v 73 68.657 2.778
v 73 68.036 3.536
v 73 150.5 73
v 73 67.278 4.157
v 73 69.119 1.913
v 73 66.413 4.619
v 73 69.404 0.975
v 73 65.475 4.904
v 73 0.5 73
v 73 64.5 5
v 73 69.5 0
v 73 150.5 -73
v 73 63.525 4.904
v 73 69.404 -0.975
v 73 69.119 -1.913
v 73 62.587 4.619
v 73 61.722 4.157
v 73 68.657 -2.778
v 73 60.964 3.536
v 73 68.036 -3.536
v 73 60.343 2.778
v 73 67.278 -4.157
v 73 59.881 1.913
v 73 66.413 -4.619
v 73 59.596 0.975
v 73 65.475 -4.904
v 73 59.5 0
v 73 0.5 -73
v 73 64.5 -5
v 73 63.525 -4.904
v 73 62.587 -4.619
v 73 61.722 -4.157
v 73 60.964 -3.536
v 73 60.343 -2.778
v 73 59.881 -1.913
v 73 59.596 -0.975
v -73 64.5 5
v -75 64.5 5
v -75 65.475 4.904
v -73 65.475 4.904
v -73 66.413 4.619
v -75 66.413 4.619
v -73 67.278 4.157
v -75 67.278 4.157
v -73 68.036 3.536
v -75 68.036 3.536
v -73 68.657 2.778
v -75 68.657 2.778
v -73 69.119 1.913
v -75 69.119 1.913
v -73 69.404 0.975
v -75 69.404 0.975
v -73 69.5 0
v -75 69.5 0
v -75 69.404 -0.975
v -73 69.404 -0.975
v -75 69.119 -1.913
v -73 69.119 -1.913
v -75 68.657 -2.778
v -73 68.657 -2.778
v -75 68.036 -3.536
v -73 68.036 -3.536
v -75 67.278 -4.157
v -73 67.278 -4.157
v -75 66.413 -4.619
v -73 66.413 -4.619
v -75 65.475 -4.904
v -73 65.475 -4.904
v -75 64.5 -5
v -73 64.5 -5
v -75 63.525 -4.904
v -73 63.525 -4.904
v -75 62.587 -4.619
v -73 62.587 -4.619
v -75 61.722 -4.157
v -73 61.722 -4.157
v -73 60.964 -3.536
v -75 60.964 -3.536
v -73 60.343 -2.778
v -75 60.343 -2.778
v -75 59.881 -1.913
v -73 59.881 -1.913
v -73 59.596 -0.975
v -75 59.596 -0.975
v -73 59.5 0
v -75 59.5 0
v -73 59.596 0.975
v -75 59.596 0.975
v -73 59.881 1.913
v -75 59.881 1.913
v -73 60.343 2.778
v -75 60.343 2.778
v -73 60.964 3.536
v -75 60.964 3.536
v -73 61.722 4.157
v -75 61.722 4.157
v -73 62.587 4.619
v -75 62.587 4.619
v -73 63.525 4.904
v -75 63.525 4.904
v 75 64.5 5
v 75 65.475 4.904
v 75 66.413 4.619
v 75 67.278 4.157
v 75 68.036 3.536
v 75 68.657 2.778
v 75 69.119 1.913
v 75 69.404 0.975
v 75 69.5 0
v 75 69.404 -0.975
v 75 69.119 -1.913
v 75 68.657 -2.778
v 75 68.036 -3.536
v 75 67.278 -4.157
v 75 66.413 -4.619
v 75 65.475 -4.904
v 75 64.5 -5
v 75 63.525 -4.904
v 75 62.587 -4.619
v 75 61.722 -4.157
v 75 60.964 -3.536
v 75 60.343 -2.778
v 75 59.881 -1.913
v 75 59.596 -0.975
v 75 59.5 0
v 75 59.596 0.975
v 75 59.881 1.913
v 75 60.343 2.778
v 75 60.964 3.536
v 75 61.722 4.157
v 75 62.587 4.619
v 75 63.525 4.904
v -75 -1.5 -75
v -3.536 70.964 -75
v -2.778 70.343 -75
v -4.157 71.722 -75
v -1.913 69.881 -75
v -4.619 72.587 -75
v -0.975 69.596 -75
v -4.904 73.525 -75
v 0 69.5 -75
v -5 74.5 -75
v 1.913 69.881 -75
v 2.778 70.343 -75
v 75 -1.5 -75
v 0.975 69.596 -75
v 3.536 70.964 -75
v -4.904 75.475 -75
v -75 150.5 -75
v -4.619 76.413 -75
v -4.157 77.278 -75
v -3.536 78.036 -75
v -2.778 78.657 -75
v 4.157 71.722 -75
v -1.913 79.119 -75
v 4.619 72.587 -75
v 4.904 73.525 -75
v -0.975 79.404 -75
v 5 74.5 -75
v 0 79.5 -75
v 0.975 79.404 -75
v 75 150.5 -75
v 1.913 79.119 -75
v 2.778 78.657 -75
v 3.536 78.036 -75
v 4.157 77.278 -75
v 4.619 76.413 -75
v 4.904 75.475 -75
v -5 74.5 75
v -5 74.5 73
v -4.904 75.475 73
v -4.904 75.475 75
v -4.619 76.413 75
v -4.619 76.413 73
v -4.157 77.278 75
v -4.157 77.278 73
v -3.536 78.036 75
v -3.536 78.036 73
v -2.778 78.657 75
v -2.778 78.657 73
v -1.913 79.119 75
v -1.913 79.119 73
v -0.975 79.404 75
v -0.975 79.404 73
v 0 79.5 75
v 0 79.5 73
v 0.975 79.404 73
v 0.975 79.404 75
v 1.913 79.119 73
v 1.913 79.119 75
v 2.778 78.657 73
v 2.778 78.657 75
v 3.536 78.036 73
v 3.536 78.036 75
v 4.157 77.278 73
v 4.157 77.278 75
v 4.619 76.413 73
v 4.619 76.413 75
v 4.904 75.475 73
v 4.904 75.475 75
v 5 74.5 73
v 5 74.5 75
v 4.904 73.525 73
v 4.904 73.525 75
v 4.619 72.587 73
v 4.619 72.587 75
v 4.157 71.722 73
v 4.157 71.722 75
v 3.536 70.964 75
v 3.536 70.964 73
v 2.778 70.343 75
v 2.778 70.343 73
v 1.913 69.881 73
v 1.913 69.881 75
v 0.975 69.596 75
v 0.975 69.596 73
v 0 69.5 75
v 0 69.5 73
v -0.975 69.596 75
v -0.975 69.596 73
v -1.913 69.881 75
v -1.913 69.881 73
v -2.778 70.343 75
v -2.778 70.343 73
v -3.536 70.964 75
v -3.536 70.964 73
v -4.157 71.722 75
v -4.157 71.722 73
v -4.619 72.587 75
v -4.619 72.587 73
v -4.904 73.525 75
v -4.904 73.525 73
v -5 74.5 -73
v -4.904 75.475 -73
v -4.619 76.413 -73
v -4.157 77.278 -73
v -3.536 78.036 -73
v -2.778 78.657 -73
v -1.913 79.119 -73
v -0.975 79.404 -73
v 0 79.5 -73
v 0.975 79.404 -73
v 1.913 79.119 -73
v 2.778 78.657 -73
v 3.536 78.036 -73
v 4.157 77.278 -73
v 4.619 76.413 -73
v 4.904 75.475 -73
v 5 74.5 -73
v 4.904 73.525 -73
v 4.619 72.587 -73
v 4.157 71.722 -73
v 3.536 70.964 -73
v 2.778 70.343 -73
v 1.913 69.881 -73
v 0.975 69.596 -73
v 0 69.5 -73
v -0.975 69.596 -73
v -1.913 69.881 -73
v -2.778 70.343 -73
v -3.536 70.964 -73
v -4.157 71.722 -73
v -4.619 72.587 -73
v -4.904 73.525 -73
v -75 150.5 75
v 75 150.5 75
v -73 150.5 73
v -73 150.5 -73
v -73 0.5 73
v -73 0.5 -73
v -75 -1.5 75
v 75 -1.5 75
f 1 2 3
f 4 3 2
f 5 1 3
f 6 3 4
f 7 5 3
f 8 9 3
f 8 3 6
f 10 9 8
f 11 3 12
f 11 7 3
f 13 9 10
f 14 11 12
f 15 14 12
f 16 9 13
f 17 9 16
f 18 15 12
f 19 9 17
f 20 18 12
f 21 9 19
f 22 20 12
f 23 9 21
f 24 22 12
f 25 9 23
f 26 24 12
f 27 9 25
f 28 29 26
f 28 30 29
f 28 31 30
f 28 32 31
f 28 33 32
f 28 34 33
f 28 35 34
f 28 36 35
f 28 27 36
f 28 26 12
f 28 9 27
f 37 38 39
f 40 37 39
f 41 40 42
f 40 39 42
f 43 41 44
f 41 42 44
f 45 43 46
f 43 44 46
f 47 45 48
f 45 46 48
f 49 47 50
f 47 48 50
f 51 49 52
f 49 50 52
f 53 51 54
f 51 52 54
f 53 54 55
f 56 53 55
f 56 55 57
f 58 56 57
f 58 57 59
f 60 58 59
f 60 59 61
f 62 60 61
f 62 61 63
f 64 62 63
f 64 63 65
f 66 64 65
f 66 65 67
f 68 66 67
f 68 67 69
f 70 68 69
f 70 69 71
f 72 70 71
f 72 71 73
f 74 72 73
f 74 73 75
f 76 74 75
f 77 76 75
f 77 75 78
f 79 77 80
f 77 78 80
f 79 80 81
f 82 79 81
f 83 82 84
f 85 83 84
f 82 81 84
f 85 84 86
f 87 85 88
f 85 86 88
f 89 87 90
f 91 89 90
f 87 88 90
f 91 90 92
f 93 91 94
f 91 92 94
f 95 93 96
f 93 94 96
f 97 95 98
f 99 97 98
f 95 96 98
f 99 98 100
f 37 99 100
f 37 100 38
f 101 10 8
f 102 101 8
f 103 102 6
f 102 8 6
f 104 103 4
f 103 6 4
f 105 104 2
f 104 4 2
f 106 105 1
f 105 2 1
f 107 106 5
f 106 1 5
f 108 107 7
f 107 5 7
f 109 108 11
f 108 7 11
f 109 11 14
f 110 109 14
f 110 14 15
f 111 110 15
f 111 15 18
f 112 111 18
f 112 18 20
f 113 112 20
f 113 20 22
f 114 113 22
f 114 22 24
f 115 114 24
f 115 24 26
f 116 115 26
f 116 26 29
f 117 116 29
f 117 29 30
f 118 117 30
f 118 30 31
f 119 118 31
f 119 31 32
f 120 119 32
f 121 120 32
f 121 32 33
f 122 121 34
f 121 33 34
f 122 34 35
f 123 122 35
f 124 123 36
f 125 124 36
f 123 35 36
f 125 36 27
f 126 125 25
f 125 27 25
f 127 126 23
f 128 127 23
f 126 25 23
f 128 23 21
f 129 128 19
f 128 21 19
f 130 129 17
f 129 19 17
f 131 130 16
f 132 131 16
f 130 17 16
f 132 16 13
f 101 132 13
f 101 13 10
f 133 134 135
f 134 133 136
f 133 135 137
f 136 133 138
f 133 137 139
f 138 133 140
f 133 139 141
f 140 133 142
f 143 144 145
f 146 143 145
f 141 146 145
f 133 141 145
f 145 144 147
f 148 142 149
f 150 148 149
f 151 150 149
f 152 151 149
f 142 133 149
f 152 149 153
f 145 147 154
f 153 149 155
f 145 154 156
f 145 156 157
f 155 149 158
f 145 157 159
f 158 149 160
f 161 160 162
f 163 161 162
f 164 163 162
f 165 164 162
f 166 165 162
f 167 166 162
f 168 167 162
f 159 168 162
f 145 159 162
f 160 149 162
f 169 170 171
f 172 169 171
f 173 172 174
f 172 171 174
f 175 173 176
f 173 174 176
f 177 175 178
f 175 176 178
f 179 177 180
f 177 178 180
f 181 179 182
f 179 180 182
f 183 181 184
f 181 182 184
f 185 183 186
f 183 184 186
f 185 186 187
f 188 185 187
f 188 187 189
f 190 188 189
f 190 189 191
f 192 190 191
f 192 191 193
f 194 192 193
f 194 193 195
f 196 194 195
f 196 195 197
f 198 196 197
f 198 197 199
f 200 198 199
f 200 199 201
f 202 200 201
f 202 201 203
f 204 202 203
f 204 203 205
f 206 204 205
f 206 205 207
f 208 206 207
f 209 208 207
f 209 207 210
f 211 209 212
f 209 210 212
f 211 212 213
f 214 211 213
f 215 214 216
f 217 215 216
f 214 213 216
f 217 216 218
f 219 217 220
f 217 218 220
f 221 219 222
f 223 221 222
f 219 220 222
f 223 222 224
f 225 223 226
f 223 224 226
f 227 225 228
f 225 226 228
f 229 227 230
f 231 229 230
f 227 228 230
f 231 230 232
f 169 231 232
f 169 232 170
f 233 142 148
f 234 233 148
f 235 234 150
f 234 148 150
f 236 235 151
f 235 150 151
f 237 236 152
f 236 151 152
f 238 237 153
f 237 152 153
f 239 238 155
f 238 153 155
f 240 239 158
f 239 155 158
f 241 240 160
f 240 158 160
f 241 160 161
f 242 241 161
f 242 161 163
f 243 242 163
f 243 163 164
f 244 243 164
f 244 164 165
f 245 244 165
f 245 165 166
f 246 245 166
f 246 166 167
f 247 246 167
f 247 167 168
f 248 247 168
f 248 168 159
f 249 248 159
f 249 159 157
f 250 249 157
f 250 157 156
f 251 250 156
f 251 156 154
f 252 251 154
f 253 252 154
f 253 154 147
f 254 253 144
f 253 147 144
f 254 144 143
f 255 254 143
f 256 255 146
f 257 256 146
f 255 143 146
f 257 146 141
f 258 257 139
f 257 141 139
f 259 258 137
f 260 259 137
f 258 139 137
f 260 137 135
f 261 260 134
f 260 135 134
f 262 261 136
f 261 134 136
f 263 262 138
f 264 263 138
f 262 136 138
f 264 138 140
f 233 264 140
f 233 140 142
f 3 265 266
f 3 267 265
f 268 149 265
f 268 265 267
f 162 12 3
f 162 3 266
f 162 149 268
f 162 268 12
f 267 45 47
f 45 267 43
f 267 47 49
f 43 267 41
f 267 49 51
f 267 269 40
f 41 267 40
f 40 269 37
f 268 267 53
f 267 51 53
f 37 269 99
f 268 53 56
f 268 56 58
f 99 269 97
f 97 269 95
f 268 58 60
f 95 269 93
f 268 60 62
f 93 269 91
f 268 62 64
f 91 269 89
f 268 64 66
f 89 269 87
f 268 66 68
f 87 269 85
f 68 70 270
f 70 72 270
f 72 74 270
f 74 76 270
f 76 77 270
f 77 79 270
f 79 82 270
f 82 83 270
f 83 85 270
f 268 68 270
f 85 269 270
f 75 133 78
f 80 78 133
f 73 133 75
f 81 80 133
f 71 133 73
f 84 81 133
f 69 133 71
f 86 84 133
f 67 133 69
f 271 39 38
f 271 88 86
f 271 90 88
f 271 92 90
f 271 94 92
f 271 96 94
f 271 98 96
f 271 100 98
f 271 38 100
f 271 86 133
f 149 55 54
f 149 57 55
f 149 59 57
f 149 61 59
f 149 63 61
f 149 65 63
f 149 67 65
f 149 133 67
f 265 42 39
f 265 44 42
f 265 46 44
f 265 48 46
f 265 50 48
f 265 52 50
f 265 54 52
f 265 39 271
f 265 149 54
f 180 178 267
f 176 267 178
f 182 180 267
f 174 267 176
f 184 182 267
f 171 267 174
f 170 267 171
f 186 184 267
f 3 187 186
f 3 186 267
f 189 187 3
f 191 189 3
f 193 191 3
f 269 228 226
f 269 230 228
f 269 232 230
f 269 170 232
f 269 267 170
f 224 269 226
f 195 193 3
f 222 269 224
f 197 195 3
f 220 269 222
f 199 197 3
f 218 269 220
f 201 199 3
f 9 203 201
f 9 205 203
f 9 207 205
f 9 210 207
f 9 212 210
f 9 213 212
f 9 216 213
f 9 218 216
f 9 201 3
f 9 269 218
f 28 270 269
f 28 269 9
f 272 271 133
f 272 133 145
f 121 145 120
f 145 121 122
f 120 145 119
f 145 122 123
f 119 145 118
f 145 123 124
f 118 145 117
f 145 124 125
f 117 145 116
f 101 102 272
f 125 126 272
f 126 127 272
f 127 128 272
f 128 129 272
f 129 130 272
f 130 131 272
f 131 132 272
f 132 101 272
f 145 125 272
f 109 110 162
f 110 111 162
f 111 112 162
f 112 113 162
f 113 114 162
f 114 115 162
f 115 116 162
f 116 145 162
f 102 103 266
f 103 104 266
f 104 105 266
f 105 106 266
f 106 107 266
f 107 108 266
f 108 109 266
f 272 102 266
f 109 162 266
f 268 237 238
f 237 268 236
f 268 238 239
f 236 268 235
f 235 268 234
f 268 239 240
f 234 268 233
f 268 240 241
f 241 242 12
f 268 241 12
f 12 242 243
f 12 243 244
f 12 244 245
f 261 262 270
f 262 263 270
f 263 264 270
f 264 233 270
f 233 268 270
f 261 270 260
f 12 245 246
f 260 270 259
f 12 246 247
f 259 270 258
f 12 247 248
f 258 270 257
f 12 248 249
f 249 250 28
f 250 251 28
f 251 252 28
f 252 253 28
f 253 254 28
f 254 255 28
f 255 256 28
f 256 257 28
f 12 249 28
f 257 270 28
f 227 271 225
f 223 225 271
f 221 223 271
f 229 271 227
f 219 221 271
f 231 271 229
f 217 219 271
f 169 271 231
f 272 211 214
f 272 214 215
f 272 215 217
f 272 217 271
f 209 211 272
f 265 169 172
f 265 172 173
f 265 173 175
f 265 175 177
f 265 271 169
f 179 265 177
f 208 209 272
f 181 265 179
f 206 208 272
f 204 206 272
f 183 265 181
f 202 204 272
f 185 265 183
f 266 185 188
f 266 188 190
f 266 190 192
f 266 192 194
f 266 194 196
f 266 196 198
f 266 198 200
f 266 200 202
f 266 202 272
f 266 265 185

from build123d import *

# Parameters (mm, degrees)
SKETCH1_W           = 150
SKETCH1_H           = 150
BOSS_EXTRUDE1_DEPTH = 0.5
SKETCH2_W           = 150
SKETCH2_H           = 150
SKETCH2_W_2         = 146
SKETCH2_H_2         = 146
BOSS_EXTRUDE2_DEPTH = 15
SKETCH6_W           = 150
SKETCH6_H           = 150
SKETCH6_W_2         = 146
SKETCH6_H_2         = 146
BOSS_EXTRUDE4_DEPTH = 135
SKETCH7_W           = 150
SKETCH7_H           = 150
BOSS_EXTRUDE5_DEPTH = 1.5
SKETCH8_R           = 5
CUT_EXTRUDE1_DEPTH  = 226.333641519
SKETCH9_R           = 5
CUT_EXTRUDE2_DEPTH  = 226.333641519


with BuildPart() as part:
    # Sketch1 → Boss-Extrude1 (new body)
    with BuildSketch(Plane(origin=(0, 0, 0), x_dir=(1, 0, 0), z_dir=(0, 1, 0))):
        Rectangle(SKETCH1_W, SKETCH1_H)
    extrude(amount=BOSS_EXTRUDE1_DEPTH)

    # Sketch2 → Boss-Extrude2 (add)
    with BuildSketch(Plane(origin=(0, 0.5, 0), x_dir=(1, 0, 0), z_dir=(0, 1, 0))):
        Rectangle(SKETCH2_W, SKETCH2_H)
        Rectangle(SKETCH2_W_2, SKETCH2_H_2, mode=Mode.SUBTRACT)
    extrude(amount=BOSS_EXTRUDE2_DEPTH)

    # Sketch6 → Boss-Extrude4 (add)
    with BuildSketch(Plane(origin=(0, 15.5, 0), x_dir=(1, 0, 0), z_dir=(0, 1, 0))):
        Rectangle(SKETCH6_W, SKETCH6_H)
        Rectangle(SKETCH6_W_2, SKETCH6_H_2, mode=Mode.SUBTRACT)
    extrude(amount=BOSS_EXTRUDE4_DEPTH)

    # Sketch7 → Boss-Extrude5 (add)
    with BuildSketch(Plane.XZ):
        Rectangle(SKETCH7_W, SKETCH7_H)
    extrude(amount=BOSS_EXTRUDE5_DEPTH)

    # Sketch8 → Cut-Extrude1 (cut, through all)
    with BuildSketch(Plane(origin=(0, 0, -75), x_dir=(-1, 0, 0), z_dir=(0, 0, -1))):
        with Locations((0, 74.5)):
            Circle(SKETCH8_R)
    extrude(amount=-CUT_EXTRUDE1_DEPTH, mode=Mode.SUBTRACT)

    # Sketch9 → Cut-Extrude2 (cut, through all)
    with BuildSketch(Plane.ZY.offset(75)):
        with Locations((0, 64.5)):
            Circle(SKETCH9_R)
    extrude(amount=-CUT_EXTRUDE2_DEPTH, mode=Mode.SUBTRACT)


solid = part.part
